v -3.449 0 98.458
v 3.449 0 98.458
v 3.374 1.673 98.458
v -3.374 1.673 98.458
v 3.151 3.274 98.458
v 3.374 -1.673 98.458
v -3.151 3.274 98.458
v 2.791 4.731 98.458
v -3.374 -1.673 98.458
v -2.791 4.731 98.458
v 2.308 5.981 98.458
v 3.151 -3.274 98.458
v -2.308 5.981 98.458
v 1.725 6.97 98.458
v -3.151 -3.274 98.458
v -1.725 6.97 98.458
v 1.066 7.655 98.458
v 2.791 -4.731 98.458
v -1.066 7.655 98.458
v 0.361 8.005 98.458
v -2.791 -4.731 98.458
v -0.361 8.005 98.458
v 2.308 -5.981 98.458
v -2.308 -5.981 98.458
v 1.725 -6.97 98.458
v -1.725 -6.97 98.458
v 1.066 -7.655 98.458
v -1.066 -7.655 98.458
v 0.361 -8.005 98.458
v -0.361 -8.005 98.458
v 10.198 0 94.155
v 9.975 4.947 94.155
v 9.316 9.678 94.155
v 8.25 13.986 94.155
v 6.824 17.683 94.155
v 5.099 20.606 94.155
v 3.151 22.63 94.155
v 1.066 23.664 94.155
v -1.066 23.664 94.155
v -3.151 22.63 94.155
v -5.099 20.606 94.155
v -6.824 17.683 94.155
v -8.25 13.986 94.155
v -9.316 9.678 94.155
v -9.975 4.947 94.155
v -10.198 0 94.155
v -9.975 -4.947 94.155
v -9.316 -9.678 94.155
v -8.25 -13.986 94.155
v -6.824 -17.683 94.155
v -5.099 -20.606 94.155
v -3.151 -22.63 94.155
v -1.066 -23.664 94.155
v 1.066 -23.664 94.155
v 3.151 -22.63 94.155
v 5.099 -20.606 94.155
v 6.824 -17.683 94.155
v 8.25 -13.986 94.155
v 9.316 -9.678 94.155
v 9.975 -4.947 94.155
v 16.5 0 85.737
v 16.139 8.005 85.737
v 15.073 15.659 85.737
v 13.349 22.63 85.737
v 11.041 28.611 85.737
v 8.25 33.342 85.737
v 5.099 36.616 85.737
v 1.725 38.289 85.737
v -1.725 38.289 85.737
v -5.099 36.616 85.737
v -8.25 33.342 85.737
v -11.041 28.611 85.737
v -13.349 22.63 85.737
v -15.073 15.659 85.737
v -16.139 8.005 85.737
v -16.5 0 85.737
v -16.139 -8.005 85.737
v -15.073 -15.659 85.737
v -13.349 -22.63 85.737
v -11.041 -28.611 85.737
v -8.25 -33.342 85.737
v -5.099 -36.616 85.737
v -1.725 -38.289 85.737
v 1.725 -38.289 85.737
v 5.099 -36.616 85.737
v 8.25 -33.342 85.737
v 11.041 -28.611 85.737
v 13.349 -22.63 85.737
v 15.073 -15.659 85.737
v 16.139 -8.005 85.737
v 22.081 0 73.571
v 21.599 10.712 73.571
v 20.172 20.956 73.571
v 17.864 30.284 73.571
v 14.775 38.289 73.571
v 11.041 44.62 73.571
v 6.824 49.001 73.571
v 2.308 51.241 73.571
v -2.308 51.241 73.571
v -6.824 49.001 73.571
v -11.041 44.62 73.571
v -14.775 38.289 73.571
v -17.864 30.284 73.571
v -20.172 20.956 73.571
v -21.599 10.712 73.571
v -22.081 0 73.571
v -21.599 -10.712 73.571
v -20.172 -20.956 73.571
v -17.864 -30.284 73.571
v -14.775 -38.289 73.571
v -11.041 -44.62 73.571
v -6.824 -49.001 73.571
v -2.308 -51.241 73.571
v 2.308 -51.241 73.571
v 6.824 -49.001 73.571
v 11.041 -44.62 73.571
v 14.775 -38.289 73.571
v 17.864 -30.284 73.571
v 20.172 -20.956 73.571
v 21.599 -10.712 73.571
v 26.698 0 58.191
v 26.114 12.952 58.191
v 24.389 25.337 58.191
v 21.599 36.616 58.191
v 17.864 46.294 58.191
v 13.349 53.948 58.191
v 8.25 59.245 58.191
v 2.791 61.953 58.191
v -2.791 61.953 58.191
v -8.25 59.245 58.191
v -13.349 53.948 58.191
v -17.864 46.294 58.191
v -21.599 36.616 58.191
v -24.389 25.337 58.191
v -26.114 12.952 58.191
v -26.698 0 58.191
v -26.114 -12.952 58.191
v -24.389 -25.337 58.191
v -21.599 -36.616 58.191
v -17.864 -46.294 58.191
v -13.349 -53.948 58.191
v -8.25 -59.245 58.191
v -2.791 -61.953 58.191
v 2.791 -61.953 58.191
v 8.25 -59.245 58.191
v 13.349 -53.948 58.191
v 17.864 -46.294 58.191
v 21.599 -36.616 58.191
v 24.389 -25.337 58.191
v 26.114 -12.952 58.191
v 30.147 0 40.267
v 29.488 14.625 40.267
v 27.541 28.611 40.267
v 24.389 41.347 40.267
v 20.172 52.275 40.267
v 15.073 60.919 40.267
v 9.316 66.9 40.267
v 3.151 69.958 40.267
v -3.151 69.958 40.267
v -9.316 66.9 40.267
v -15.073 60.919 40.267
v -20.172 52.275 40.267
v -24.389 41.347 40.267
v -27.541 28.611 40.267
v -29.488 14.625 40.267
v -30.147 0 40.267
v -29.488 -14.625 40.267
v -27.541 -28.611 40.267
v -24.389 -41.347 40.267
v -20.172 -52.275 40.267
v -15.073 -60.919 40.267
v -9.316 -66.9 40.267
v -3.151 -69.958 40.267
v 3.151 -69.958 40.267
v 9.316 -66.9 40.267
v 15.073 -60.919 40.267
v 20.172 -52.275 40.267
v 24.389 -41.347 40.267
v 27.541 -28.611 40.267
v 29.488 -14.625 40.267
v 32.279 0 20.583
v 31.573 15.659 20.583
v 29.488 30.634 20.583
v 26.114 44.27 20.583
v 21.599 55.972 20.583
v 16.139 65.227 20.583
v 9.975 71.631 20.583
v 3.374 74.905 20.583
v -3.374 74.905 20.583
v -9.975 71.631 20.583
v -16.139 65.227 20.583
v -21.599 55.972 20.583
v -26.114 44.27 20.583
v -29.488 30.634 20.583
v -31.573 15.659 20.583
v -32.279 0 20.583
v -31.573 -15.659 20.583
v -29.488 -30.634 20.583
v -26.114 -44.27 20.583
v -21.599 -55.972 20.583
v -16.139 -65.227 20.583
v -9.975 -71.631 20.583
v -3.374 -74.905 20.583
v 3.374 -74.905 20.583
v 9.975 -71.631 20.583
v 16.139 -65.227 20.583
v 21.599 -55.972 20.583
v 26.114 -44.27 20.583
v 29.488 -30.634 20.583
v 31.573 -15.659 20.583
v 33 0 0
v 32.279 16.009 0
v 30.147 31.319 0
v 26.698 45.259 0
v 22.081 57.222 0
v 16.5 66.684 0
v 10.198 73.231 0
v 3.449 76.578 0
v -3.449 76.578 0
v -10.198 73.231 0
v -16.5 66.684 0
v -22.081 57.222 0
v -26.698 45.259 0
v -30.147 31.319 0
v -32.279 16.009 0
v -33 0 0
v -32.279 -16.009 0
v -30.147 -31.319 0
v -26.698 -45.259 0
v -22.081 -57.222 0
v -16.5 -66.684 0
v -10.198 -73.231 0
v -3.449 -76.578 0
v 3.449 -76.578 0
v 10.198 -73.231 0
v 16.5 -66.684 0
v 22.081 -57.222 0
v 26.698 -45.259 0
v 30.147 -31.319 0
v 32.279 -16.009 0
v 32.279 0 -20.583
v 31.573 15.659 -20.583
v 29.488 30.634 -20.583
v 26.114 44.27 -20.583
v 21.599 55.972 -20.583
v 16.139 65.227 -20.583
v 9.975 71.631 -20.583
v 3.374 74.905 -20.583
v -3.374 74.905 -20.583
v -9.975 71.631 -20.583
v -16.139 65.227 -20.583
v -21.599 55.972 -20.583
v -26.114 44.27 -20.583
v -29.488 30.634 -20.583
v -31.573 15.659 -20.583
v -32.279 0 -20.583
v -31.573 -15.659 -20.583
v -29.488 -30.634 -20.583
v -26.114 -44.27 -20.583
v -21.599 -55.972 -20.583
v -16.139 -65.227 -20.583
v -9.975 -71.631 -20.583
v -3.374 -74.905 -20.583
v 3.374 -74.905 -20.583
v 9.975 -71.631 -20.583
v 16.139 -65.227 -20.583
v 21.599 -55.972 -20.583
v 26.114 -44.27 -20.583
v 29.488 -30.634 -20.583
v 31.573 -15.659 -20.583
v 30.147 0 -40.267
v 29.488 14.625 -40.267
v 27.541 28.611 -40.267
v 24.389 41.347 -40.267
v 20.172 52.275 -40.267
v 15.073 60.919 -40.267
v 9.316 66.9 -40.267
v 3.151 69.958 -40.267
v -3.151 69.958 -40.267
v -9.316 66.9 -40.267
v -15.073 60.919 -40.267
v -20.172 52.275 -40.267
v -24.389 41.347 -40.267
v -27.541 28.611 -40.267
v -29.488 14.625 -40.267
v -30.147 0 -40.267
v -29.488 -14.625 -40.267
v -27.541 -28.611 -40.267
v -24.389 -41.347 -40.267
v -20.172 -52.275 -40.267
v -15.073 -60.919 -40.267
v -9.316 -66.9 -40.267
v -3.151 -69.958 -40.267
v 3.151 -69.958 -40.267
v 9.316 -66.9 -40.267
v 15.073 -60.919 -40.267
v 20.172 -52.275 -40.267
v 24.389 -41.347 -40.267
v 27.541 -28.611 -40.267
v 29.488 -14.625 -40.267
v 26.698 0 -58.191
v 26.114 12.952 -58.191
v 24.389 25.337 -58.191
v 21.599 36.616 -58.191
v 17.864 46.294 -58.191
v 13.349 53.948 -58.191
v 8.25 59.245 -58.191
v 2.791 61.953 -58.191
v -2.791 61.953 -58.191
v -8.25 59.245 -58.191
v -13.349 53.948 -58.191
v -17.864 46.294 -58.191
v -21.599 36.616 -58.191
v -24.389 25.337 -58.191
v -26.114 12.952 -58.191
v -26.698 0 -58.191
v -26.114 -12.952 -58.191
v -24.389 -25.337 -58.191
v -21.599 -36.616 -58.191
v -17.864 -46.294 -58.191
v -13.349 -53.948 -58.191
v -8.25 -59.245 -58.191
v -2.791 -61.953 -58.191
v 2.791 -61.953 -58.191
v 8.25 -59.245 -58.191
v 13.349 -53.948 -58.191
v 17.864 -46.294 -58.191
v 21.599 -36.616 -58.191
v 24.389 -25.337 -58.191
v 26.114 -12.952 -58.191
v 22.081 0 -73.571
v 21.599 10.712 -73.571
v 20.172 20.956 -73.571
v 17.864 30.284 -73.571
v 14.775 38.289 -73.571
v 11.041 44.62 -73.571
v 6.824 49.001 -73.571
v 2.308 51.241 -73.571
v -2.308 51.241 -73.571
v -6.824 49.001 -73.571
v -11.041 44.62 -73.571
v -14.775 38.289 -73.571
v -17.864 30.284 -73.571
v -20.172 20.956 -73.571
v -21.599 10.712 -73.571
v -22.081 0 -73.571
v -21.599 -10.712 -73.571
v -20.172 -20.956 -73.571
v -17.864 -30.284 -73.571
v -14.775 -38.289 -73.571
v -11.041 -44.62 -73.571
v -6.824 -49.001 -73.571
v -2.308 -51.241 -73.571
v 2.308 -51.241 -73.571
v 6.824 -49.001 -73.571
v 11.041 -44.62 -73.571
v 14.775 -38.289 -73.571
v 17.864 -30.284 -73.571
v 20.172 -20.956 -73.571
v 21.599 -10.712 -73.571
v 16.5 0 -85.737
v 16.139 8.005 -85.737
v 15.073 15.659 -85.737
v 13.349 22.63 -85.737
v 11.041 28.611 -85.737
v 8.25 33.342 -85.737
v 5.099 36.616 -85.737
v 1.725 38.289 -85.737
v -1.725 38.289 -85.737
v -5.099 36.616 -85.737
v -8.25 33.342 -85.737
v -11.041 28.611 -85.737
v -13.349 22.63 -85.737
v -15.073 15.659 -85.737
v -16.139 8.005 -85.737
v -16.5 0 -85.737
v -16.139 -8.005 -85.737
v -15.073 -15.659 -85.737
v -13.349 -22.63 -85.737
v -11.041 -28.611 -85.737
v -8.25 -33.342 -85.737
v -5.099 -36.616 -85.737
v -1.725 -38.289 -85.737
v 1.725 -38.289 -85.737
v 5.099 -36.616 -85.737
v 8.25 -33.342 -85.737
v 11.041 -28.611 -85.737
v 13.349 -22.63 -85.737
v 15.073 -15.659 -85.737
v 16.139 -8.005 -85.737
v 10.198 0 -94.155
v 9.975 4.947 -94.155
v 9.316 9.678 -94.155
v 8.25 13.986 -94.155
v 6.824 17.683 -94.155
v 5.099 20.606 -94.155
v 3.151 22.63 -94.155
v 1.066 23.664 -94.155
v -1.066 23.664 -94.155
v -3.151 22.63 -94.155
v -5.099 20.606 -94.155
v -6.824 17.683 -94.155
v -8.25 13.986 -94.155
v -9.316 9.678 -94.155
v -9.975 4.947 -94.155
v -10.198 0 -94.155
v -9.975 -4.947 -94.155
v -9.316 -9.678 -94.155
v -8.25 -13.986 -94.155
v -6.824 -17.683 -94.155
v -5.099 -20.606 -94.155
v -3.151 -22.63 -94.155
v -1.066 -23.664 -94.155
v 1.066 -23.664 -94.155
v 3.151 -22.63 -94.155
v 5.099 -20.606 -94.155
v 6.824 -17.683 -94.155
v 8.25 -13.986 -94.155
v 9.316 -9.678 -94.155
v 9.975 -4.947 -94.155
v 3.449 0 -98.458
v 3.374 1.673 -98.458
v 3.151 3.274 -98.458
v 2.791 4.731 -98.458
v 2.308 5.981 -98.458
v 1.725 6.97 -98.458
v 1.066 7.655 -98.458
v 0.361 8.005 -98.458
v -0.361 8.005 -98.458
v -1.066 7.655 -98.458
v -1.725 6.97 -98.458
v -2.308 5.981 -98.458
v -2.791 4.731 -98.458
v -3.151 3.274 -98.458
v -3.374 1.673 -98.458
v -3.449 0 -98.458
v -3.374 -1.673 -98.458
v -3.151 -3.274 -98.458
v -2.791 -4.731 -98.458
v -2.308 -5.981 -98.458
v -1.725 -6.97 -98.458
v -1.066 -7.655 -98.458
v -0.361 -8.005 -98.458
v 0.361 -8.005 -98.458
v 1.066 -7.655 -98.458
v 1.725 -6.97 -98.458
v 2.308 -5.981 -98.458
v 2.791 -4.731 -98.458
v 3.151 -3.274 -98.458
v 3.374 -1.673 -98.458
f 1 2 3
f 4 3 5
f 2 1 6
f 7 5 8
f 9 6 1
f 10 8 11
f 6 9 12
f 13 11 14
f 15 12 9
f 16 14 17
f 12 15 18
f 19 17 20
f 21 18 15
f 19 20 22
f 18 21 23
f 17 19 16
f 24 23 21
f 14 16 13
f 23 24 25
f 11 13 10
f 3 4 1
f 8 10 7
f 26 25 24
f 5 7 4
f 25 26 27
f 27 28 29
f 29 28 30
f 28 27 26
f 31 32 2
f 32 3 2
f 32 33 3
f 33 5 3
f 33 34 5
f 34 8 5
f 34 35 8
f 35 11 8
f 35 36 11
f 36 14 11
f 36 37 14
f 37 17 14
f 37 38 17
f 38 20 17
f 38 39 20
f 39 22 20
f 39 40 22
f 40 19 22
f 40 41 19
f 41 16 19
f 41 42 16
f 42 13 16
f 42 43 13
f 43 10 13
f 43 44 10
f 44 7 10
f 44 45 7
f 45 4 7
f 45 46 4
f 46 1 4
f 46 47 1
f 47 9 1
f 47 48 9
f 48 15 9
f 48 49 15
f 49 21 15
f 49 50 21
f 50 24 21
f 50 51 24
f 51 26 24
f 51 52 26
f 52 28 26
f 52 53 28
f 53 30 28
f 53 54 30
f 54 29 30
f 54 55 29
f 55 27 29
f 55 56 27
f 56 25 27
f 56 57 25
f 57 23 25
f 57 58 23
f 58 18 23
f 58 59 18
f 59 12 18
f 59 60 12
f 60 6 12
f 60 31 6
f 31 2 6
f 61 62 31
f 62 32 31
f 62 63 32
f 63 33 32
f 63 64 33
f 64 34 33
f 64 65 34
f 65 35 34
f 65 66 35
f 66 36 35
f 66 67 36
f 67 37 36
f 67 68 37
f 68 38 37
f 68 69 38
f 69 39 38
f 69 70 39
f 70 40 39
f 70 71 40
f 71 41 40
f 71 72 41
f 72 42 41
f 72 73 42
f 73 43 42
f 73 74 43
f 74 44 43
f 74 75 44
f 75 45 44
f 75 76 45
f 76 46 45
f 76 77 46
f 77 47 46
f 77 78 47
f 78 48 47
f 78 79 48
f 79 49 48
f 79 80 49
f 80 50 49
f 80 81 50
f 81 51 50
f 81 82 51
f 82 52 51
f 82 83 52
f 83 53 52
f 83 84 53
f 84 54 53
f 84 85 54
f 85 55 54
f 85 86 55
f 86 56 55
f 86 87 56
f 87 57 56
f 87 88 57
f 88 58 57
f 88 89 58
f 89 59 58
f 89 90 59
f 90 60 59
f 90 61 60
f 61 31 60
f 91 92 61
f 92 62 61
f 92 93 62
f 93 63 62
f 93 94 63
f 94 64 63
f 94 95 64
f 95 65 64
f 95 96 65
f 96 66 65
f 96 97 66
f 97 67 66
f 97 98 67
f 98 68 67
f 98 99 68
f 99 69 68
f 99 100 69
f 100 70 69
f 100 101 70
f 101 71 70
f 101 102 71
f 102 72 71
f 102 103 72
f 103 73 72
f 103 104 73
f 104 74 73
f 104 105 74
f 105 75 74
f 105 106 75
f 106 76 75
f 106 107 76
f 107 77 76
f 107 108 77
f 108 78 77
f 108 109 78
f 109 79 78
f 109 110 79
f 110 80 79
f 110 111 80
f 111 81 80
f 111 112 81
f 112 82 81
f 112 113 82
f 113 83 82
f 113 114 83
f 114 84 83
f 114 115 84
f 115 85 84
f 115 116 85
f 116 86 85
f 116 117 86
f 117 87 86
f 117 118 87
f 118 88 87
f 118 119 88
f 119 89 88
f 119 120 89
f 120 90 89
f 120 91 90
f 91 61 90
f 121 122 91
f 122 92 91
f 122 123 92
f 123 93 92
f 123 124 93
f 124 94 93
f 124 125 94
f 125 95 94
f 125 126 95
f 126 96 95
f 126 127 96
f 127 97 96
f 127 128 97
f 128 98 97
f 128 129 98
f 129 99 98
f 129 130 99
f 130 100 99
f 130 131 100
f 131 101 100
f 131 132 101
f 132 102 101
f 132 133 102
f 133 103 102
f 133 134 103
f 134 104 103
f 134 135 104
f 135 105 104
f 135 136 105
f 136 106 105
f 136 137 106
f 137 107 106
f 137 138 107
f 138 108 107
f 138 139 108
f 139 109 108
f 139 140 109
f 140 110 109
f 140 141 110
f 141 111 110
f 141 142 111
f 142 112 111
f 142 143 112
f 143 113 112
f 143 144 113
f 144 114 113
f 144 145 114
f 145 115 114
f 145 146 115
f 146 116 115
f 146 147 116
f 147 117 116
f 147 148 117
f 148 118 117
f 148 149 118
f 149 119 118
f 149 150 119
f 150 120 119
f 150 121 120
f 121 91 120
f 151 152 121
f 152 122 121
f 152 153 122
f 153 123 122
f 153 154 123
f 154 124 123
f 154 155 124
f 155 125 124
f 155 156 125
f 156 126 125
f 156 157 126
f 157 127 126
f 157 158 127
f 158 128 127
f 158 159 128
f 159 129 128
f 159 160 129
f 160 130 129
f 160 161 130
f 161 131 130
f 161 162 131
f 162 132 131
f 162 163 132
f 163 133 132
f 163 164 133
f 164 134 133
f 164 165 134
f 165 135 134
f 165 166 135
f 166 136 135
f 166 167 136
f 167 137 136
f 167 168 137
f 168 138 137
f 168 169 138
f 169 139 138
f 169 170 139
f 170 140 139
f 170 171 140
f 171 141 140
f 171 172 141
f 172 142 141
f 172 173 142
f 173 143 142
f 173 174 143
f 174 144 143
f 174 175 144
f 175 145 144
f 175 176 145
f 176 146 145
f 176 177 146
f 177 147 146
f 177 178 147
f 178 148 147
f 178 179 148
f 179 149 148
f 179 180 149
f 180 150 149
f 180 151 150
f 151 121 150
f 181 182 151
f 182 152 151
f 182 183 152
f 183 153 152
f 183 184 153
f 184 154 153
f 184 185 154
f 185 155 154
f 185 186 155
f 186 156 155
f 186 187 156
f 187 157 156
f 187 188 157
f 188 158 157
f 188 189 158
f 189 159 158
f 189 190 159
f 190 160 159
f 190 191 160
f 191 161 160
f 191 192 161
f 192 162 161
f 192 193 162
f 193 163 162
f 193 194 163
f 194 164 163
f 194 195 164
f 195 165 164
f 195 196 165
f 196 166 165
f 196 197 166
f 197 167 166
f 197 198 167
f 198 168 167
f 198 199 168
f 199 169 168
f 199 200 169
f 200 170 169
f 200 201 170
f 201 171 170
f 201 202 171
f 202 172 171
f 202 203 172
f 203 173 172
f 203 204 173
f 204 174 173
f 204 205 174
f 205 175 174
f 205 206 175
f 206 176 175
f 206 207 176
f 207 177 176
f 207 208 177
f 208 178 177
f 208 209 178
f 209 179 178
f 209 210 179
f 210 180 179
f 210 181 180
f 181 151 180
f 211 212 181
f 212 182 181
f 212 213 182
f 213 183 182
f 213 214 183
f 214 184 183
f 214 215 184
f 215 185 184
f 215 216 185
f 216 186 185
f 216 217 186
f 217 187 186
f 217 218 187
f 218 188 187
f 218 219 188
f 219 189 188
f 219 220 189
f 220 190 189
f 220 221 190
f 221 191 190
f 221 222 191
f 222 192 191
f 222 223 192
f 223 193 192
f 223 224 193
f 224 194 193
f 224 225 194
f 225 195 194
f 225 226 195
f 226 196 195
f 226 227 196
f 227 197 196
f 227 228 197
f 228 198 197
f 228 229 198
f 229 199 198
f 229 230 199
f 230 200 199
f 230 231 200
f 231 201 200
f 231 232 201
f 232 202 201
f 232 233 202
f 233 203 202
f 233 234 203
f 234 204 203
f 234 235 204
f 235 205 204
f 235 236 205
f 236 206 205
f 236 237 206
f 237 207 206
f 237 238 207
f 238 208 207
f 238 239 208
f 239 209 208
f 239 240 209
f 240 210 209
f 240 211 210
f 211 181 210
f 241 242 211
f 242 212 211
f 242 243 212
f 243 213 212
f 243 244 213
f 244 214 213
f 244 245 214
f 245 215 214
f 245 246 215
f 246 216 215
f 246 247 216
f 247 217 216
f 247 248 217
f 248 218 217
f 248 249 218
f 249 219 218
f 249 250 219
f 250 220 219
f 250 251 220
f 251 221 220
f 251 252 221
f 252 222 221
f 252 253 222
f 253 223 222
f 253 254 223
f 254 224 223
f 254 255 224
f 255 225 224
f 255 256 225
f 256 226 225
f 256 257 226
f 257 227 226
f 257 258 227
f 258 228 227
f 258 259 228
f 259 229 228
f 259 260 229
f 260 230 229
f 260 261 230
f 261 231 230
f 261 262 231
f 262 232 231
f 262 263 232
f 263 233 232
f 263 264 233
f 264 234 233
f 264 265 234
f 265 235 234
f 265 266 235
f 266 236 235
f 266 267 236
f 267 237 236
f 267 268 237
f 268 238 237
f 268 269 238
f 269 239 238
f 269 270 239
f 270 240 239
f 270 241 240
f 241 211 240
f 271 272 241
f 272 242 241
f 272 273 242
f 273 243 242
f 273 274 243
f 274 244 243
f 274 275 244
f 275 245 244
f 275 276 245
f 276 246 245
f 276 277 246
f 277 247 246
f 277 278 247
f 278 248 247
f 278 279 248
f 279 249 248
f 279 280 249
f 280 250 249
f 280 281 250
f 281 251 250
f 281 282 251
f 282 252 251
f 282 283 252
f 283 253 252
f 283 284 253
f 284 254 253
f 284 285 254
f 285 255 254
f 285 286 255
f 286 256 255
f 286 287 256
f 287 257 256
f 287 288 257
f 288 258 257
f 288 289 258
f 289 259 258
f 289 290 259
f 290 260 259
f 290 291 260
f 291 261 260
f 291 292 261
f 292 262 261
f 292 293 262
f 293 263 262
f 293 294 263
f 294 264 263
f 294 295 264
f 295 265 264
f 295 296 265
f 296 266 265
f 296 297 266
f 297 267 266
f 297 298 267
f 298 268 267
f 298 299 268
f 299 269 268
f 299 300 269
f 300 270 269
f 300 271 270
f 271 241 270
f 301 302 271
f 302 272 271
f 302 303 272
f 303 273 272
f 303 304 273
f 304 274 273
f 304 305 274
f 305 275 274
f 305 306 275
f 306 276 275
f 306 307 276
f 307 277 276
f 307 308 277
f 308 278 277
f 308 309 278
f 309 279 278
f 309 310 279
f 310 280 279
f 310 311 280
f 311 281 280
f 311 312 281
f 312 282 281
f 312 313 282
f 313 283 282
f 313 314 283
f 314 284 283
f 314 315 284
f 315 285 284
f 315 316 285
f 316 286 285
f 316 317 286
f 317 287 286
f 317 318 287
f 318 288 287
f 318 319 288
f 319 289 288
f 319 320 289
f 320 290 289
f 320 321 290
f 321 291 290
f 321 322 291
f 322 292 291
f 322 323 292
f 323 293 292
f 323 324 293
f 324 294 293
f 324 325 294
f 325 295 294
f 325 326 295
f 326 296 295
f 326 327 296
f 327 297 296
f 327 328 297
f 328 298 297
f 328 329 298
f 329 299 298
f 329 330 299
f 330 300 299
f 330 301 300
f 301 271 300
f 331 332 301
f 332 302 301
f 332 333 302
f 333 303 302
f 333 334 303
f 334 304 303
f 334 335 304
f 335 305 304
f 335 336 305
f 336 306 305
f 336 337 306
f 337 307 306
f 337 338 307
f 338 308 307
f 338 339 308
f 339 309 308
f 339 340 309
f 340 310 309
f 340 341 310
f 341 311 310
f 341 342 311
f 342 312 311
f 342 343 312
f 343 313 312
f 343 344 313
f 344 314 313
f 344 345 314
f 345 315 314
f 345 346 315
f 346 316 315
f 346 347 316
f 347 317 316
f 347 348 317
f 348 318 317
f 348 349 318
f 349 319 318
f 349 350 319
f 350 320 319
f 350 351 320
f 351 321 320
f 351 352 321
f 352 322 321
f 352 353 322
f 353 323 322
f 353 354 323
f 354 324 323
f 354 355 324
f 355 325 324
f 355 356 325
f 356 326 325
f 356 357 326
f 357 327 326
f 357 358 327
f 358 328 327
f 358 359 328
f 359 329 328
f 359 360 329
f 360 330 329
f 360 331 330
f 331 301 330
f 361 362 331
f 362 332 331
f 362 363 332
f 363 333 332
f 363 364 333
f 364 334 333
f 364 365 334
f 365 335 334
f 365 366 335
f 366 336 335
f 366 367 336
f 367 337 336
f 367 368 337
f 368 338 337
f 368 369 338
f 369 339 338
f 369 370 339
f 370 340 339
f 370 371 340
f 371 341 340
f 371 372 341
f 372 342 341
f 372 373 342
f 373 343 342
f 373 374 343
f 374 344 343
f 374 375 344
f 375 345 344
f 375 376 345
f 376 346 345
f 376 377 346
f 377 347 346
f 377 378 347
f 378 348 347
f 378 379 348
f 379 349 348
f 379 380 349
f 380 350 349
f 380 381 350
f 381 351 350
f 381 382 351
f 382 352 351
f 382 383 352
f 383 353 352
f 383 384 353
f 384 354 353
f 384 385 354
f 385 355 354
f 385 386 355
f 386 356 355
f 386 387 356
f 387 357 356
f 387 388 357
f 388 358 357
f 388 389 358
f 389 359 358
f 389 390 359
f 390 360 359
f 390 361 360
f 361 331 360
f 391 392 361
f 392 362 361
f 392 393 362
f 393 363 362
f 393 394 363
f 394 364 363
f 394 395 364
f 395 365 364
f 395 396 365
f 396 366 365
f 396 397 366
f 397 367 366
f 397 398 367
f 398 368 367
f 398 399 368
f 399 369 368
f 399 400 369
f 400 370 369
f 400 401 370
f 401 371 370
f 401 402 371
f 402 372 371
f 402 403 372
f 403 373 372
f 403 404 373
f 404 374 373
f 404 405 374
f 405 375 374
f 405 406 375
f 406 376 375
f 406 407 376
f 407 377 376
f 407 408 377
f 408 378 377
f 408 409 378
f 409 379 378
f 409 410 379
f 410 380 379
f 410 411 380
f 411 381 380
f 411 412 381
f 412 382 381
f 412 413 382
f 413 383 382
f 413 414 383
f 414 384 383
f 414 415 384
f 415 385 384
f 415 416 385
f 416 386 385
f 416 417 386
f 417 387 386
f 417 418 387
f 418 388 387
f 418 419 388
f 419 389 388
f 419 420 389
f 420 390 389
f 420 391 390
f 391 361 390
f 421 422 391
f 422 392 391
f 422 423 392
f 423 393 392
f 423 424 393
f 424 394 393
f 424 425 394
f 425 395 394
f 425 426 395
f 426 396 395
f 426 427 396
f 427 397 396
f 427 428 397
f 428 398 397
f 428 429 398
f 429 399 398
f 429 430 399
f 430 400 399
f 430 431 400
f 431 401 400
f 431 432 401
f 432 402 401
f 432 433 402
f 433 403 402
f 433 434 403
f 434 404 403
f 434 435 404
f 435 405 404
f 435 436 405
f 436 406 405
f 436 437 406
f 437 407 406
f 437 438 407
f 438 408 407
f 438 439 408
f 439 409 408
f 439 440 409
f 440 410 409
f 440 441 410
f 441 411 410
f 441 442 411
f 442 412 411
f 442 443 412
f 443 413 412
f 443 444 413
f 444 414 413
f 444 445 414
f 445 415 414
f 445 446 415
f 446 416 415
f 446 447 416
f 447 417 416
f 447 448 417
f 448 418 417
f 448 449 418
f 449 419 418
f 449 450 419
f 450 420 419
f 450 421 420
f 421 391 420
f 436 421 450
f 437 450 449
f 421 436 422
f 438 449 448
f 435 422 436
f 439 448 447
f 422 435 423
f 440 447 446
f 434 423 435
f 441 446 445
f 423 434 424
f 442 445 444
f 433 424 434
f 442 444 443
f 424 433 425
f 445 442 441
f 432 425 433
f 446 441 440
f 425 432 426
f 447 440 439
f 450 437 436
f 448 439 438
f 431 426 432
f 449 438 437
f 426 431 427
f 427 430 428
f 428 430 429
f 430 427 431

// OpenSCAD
// Generated by SolidPython 1.0.1 on 2020-07-29 00:46:45


scale(v = [3, 7, 9]) {
	sphere(r = 11);
}
/***********************************************
*********      SolidPython code:      **********
************************************************
 
# import packages: SolidPython
from solid import *
from solid.utils import *
from itertools import chain, combinations, permutations


class Resize:

    def __init__(self, scad_file):
        self.scad_file = scad_file
        #self.scad_file = import_scad(scad_file)
        # cone/cylinder param:
        self.r1 = 0
        self.r2 = 0
        self.h = 0
        # rectangular prism param:
        self.w = 0
        self.l = 0
        # ellipse param:
        self.r = 0

    # import OpenScad code (file name corresponds to shape)


    # classify shape + parameters
    def assign(self, param1, param2, param3):
        if self.scad_file == 'cone.scad':
            self.r1 = param1
            self.r2 = param2
            self.h = param3
        elif self.scad_file == 'cylinder.scad':
            self.r1 = param1
            self.r2 = param2
            self.h = param3
        elif self.scad_file == 'rectangularPrism.scad':
            self.h = param1
            self.l = param2
            self.w = param3
        else:
            self.r = param1
            self.h = param2

    # resize parameters
    def iterate(self):
        x = range(3, 20, 2)
        i = 1
        if self.scad_file == 'cone.scad':
            tempList = list(permutations(x, 2))
            for temp in tempList:
                param1 = temp[0]
                param2 = temp[1]
                filepath = 'produced_scad_files/' + 'cone' + str(param1) + '_' + str(param2) + '_' + '.scad'
                scad_render_to_file(cylinder(h=param1, r1=param2, r2=0), filepath)

        elif self.scad_file == 'cylinder.scad':
            tempList = list(permutations(x, 3))
            for temp in tempList:
                param1 = temp[0]
                param2 = temp[1]
                filepath = 'produced_scad_files/' + 'cylinder' + str(param1) + '_' + str(param2) + '_' + '.scad'
                scad_render_to_file(cylinder(h=param1, r1=param2, r2=param2), filepath)

        elif self.scad_file == 'rectangularPrism.scad':
            tempList = list(permutations(x, 3))
            for temp in tempList:
                param1 = temp[0]
                param2 = temp[1]
                param3 = temp[2]
                filepath = 'produced_scad_files/' + 'rectangularPrism' + str(param1) + '_' + str(param2) + '_' + str(
                    param3) + '.scad'
                scad_render_to_file(cube(size=(param1, param2, param3)), filepath)

        elif self.scad_file == 'ellipse.scad':
            tempList = list(permutations(x, 4))
            for temp in tempList:
                param1 = temp[0]
                param2 = temp[1]
                param3 = temp[2]
                param4 = temp[3]
                filepath = 'produced_scad_files/' + 'ellipse' + str(param1) + '_' + str(param2) + '_' + str(param3) + '_' + str(param4) + '.scad'
                scad_render_to_file(scale([param1, param2, param3])(sphere(r=param4)), filepath)

    def render_to_scadfile(self):
        scad_render_to_file(scad, 'example.scad') 
 
************************************************/
